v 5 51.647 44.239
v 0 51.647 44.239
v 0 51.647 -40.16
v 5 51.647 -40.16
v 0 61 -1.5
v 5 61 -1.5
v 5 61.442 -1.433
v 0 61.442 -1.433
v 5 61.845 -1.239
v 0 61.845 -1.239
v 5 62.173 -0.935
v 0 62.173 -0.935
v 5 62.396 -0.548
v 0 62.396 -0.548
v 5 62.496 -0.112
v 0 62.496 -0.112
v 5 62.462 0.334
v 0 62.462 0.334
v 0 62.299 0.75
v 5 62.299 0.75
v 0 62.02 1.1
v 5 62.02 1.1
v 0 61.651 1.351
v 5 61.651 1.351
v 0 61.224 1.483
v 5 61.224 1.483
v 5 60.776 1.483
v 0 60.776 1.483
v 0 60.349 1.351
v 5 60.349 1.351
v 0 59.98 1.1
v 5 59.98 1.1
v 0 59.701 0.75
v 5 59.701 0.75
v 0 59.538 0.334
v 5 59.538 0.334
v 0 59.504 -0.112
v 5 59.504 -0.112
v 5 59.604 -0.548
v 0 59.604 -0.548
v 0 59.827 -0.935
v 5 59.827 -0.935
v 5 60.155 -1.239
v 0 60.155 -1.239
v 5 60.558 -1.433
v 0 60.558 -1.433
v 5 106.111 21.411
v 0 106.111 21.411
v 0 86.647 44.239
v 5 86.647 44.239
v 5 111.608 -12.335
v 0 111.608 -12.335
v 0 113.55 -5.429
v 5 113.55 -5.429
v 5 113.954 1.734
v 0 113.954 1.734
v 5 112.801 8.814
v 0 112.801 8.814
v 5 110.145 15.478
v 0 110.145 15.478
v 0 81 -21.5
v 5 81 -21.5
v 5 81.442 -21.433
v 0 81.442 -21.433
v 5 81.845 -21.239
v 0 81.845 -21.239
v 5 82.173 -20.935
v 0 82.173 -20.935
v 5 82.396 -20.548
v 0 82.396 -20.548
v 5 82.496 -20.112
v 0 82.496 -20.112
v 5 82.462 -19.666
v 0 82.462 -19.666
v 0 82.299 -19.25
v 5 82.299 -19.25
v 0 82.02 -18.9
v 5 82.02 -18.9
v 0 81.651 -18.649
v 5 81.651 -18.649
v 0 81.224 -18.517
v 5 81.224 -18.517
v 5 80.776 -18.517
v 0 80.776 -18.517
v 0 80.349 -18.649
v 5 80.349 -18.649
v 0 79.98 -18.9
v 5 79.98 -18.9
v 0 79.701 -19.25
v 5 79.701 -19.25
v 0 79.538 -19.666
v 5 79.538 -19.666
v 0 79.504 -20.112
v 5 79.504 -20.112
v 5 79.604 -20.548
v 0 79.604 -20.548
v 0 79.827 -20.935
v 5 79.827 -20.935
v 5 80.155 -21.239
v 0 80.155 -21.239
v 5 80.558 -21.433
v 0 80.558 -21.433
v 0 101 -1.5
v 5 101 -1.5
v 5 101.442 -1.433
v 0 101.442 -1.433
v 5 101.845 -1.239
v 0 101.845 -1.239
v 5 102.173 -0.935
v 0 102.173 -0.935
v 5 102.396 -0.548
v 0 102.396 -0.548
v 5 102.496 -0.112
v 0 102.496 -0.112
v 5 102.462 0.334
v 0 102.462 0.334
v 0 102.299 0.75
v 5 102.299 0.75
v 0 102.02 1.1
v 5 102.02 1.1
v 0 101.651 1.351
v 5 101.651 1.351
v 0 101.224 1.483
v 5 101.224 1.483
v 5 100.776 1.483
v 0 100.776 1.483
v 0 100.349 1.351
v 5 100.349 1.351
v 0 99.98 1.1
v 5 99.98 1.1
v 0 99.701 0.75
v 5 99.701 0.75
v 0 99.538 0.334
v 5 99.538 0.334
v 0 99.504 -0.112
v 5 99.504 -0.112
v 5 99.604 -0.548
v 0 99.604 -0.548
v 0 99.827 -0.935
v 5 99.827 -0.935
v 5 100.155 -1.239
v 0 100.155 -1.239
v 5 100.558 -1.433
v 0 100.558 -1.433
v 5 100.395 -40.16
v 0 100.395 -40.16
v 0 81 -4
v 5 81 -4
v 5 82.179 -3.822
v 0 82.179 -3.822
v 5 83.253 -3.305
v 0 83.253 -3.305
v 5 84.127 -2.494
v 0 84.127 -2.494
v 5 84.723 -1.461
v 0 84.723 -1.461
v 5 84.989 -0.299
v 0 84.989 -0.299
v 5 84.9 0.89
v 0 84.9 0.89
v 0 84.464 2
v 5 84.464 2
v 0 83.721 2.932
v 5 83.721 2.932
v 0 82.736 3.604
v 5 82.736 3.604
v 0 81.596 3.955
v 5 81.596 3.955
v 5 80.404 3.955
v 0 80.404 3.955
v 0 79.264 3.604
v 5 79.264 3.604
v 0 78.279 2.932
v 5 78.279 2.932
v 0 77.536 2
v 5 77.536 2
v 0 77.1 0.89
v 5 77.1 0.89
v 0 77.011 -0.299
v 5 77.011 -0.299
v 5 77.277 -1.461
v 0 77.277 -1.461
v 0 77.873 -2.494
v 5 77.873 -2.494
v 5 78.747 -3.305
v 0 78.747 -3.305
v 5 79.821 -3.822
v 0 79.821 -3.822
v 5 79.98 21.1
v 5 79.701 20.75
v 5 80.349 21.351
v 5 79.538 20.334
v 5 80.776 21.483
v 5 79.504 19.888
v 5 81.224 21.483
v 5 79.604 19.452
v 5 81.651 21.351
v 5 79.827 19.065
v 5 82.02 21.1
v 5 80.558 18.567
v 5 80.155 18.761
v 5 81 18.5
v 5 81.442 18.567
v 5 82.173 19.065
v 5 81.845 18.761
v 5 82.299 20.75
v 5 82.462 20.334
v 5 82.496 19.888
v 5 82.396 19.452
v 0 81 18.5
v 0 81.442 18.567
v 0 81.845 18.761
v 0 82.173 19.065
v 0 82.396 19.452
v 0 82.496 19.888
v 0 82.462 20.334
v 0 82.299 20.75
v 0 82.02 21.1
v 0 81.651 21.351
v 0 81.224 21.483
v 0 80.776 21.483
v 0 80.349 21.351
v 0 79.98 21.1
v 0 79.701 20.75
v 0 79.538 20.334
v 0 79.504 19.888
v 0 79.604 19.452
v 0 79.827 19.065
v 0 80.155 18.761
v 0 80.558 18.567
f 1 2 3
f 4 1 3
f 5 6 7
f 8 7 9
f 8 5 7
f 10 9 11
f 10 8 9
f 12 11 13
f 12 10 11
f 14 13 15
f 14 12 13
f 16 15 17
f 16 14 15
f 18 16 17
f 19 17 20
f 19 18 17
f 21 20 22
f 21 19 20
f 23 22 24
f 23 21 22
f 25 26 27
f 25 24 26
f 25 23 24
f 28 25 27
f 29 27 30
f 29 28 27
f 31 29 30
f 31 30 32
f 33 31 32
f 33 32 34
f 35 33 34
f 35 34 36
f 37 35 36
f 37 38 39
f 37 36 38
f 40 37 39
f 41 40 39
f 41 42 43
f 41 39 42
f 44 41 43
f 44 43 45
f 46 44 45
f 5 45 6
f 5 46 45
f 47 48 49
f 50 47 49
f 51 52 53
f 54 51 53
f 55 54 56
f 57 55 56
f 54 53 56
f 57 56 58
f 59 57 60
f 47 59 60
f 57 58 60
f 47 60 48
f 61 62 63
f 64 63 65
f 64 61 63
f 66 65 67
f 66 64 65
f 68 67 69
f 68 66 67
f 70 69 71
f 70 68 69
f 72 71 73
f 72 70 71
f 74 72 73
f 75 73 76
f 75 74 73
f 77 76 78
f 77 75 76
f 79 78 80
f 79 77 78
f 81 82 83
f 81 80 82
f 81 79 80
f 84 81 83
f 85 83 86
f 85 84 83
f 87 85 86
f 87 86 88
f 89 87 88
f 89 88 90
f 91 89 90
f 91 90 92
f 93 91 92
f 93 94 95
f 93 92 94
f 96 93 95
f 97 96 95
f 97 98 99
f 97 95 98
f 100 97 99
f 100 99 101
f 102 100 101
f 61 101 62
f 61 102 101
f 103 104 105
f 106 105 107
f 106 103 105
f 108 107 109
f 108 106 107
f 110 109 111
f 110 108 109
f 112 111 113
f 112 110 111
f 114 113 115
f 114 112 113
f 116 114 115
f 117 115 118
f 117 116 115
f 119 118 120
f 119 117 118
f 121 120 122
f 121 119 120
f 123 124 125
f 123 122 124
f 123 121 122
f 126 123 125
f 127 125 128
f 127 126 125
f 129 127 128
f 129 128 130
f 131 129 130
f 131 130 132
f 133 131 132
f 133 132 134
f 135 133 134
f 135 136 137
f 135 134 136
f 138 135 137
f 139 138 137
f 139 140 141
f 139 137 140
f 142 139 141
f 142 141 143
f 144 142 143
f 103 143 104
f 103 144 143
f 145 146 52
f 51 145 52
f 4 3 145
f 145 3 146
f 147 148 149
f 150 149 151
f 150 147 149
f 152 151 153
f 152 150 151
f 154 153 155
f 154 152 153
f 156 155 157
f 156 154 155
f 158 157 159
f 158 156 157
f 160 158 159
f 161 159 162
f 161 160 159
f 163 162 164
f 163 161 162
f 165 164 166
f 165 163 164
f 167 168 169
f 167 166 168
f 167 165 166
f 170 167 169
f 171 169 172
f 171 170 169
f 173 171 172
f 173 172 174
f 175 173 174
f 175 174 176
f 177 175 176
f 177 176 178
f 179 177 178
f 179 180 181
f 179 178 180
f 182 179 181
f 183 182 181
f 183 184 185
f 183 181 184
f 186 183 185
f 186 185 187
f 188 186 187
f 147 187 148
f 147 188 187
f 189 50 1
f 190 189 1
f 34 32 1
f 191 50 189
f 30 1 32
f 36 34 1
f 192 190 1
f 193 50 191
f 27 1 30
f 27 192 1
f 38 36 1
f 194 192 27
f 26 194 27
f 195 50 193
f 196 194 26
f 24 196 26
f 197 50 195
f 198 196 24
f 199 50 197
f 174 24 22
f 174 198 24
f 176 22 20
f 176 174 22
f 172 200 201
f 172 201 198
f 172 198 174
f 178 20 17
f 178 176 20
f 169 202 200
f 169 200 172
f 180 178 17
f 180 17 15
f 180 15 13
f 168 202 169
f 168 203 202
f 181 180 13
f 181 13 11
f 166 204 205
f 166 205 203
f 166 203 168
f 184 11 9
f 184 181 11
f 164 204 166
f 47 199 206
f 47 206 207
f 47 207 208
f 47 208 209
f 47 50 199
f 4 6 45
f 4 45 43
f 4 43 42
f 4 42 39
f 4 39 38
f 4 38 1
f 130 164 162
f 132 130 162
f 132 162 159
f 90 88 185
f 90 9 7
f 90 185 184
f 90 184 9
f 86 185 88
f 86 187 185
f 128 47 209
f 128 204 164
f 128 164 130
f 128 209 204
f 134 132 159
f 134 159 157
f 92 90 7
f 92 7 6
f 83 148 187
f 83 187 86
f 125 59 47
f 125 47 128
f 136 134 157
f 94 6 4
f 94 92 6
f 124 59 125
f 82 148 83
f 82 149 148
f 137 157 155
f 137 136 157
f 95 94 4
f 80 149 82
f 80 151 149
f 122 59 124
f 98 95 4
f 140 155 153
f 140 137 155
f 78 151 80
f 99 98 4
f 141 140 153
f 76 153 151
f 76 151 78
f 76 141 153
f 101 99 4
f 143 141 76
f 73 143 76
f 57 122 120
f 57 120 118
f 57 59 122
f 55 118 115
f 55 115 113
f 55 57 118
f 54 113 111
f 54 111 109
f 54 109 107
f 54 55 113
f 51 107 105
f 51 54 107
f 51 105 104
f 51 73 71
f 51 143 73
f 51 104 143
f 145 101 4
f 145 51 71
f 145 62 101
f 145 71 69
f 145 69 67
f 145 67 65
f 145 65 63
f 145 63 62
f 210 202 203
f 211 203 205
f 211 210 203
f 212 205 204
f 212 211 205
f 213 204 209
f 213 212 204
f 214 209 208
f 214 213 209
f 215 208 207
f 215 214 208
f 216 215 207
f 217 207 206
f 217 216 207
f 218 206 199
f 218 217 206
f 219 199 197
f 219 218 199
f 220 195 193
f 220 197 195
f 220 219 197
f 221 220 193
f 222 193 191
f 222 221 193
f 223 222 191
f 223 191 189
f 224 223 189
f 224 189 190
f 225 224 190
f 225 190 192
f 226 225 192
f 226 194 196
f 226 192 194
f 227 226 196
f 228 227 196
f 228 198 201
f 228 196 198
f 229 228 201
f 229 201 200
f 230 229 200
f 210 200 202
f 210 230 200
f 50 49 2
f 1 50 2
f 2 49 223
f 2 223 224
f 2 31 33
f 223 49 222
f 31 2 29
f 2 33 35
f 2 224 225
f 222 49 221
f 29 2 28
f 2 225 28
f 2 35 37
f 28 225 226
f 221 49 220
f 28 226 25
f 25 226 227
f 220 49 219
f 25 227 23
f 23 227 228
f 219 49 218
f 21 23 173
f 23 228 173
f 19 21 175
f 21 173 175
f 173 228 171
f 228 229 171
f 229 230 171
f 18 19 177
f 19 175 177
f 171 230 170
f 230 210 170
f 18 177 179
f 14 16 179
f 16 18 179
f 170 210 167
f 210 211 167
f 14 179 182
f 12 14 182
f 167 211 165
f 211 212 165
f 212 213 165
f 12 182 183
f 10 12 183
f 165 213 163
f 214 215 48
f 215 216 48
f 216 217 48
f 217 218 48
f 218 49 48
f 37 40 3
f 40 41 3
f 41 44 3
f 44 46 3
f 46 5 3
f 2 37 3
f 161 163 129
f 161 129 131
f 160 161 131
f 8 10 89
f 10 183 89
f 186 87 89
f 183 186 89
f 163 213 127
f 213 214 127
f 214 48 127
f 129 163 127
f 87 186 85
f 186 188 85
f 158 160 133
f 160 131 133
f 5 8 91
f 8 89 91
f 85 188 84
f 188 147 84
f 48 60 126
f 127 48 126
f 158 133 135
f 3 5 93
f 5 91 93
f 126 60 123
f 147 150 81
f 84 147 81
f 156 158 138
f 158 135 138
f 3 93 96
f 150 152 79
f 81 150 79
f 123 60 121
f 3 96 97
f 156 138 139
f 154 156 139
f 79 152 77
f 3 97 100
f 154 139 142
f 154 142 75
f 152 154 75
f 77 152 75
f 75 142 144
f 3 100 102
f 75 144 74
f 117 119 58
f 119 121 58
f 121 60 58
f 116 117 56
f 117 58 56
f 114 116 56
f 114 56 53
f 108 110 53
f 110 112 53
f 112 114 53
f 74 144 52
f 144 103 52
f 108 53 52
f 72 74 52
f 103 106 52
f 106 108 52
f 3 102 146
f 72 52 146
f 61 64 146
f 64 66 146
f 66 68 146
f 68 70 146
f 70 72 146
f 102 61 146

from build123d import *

# Parameters (mm, degrees)
ESTRUSIONE_ESTRUSIONE1_DEPTH = 5
SCHIZZO2_R                   = 4
SCHIZZO2_R_2                 = 1.5
TAGLIO_ESTRUSIONE1_DEPTH     = 6


with BuildPart() as part:
    # Schizzo3 → Estrusione-Estrusione1 (new body)
    with BuildSketch(Plane(origin=(0, 0, 0), x_dir=(0, 0, -1), z_dir=(1, 0, 0))):
        with BuildLine():
            Line((40.160183768, 51.647051924), (40.160183768, 100.394835388))
            Line((40.160183768, 100.394835388), (12.334616938, 111.608123513))
            ThreePointArc((12.334616938, 111.608123513), (-5.305430843, 113.570729245), (-21.410737295, 106.111358555))
            Line((-21.410737295, 106.111358555), (-44.239245072, 86.647051924))
            Line((-44.239245072, 86.647051924), (-44.239245072, 51.647051924))
            Line((-44.239245072, 51.647051924), (40.160183768, 51.647051924))
        make_face()
    extrude(amount=ESTRUSIONE_ESTRUSIONE1_DEPTH)

    # Schizzo2 → Taglio-Estrusione1 (cut, through all)
    with BuildSketch(Plane(origin=(0, 0, 0), x_dir=(0, 0, -1), z_dir=(1, 0, 0))):
        with Locations((-95, 0)):
            Circle(SCHIZZO2_R)
        with Locations((201, 0)):
            Circle(SCHIZZO2_R)
        with Locations((0, 101)):
            Circle(SCHIZZO2_R_2)
        with Locations((0, 61)):
            Circle(SCHIZZO2_R_2)
        with Locations((20, 81)):
            Circle(SCHIZZO2_R_2)
        with Locations((-20, 81)):
            Circle(SCHIZZO2_R_2)
        with Locations((0, 81)):
            Circle(SCHIZZO2_R)
    extrude(amount=TAGLIO_ESTRUSIONE1_DEPTH, mode=Mode.SUBTRACT)


solid = part.part
